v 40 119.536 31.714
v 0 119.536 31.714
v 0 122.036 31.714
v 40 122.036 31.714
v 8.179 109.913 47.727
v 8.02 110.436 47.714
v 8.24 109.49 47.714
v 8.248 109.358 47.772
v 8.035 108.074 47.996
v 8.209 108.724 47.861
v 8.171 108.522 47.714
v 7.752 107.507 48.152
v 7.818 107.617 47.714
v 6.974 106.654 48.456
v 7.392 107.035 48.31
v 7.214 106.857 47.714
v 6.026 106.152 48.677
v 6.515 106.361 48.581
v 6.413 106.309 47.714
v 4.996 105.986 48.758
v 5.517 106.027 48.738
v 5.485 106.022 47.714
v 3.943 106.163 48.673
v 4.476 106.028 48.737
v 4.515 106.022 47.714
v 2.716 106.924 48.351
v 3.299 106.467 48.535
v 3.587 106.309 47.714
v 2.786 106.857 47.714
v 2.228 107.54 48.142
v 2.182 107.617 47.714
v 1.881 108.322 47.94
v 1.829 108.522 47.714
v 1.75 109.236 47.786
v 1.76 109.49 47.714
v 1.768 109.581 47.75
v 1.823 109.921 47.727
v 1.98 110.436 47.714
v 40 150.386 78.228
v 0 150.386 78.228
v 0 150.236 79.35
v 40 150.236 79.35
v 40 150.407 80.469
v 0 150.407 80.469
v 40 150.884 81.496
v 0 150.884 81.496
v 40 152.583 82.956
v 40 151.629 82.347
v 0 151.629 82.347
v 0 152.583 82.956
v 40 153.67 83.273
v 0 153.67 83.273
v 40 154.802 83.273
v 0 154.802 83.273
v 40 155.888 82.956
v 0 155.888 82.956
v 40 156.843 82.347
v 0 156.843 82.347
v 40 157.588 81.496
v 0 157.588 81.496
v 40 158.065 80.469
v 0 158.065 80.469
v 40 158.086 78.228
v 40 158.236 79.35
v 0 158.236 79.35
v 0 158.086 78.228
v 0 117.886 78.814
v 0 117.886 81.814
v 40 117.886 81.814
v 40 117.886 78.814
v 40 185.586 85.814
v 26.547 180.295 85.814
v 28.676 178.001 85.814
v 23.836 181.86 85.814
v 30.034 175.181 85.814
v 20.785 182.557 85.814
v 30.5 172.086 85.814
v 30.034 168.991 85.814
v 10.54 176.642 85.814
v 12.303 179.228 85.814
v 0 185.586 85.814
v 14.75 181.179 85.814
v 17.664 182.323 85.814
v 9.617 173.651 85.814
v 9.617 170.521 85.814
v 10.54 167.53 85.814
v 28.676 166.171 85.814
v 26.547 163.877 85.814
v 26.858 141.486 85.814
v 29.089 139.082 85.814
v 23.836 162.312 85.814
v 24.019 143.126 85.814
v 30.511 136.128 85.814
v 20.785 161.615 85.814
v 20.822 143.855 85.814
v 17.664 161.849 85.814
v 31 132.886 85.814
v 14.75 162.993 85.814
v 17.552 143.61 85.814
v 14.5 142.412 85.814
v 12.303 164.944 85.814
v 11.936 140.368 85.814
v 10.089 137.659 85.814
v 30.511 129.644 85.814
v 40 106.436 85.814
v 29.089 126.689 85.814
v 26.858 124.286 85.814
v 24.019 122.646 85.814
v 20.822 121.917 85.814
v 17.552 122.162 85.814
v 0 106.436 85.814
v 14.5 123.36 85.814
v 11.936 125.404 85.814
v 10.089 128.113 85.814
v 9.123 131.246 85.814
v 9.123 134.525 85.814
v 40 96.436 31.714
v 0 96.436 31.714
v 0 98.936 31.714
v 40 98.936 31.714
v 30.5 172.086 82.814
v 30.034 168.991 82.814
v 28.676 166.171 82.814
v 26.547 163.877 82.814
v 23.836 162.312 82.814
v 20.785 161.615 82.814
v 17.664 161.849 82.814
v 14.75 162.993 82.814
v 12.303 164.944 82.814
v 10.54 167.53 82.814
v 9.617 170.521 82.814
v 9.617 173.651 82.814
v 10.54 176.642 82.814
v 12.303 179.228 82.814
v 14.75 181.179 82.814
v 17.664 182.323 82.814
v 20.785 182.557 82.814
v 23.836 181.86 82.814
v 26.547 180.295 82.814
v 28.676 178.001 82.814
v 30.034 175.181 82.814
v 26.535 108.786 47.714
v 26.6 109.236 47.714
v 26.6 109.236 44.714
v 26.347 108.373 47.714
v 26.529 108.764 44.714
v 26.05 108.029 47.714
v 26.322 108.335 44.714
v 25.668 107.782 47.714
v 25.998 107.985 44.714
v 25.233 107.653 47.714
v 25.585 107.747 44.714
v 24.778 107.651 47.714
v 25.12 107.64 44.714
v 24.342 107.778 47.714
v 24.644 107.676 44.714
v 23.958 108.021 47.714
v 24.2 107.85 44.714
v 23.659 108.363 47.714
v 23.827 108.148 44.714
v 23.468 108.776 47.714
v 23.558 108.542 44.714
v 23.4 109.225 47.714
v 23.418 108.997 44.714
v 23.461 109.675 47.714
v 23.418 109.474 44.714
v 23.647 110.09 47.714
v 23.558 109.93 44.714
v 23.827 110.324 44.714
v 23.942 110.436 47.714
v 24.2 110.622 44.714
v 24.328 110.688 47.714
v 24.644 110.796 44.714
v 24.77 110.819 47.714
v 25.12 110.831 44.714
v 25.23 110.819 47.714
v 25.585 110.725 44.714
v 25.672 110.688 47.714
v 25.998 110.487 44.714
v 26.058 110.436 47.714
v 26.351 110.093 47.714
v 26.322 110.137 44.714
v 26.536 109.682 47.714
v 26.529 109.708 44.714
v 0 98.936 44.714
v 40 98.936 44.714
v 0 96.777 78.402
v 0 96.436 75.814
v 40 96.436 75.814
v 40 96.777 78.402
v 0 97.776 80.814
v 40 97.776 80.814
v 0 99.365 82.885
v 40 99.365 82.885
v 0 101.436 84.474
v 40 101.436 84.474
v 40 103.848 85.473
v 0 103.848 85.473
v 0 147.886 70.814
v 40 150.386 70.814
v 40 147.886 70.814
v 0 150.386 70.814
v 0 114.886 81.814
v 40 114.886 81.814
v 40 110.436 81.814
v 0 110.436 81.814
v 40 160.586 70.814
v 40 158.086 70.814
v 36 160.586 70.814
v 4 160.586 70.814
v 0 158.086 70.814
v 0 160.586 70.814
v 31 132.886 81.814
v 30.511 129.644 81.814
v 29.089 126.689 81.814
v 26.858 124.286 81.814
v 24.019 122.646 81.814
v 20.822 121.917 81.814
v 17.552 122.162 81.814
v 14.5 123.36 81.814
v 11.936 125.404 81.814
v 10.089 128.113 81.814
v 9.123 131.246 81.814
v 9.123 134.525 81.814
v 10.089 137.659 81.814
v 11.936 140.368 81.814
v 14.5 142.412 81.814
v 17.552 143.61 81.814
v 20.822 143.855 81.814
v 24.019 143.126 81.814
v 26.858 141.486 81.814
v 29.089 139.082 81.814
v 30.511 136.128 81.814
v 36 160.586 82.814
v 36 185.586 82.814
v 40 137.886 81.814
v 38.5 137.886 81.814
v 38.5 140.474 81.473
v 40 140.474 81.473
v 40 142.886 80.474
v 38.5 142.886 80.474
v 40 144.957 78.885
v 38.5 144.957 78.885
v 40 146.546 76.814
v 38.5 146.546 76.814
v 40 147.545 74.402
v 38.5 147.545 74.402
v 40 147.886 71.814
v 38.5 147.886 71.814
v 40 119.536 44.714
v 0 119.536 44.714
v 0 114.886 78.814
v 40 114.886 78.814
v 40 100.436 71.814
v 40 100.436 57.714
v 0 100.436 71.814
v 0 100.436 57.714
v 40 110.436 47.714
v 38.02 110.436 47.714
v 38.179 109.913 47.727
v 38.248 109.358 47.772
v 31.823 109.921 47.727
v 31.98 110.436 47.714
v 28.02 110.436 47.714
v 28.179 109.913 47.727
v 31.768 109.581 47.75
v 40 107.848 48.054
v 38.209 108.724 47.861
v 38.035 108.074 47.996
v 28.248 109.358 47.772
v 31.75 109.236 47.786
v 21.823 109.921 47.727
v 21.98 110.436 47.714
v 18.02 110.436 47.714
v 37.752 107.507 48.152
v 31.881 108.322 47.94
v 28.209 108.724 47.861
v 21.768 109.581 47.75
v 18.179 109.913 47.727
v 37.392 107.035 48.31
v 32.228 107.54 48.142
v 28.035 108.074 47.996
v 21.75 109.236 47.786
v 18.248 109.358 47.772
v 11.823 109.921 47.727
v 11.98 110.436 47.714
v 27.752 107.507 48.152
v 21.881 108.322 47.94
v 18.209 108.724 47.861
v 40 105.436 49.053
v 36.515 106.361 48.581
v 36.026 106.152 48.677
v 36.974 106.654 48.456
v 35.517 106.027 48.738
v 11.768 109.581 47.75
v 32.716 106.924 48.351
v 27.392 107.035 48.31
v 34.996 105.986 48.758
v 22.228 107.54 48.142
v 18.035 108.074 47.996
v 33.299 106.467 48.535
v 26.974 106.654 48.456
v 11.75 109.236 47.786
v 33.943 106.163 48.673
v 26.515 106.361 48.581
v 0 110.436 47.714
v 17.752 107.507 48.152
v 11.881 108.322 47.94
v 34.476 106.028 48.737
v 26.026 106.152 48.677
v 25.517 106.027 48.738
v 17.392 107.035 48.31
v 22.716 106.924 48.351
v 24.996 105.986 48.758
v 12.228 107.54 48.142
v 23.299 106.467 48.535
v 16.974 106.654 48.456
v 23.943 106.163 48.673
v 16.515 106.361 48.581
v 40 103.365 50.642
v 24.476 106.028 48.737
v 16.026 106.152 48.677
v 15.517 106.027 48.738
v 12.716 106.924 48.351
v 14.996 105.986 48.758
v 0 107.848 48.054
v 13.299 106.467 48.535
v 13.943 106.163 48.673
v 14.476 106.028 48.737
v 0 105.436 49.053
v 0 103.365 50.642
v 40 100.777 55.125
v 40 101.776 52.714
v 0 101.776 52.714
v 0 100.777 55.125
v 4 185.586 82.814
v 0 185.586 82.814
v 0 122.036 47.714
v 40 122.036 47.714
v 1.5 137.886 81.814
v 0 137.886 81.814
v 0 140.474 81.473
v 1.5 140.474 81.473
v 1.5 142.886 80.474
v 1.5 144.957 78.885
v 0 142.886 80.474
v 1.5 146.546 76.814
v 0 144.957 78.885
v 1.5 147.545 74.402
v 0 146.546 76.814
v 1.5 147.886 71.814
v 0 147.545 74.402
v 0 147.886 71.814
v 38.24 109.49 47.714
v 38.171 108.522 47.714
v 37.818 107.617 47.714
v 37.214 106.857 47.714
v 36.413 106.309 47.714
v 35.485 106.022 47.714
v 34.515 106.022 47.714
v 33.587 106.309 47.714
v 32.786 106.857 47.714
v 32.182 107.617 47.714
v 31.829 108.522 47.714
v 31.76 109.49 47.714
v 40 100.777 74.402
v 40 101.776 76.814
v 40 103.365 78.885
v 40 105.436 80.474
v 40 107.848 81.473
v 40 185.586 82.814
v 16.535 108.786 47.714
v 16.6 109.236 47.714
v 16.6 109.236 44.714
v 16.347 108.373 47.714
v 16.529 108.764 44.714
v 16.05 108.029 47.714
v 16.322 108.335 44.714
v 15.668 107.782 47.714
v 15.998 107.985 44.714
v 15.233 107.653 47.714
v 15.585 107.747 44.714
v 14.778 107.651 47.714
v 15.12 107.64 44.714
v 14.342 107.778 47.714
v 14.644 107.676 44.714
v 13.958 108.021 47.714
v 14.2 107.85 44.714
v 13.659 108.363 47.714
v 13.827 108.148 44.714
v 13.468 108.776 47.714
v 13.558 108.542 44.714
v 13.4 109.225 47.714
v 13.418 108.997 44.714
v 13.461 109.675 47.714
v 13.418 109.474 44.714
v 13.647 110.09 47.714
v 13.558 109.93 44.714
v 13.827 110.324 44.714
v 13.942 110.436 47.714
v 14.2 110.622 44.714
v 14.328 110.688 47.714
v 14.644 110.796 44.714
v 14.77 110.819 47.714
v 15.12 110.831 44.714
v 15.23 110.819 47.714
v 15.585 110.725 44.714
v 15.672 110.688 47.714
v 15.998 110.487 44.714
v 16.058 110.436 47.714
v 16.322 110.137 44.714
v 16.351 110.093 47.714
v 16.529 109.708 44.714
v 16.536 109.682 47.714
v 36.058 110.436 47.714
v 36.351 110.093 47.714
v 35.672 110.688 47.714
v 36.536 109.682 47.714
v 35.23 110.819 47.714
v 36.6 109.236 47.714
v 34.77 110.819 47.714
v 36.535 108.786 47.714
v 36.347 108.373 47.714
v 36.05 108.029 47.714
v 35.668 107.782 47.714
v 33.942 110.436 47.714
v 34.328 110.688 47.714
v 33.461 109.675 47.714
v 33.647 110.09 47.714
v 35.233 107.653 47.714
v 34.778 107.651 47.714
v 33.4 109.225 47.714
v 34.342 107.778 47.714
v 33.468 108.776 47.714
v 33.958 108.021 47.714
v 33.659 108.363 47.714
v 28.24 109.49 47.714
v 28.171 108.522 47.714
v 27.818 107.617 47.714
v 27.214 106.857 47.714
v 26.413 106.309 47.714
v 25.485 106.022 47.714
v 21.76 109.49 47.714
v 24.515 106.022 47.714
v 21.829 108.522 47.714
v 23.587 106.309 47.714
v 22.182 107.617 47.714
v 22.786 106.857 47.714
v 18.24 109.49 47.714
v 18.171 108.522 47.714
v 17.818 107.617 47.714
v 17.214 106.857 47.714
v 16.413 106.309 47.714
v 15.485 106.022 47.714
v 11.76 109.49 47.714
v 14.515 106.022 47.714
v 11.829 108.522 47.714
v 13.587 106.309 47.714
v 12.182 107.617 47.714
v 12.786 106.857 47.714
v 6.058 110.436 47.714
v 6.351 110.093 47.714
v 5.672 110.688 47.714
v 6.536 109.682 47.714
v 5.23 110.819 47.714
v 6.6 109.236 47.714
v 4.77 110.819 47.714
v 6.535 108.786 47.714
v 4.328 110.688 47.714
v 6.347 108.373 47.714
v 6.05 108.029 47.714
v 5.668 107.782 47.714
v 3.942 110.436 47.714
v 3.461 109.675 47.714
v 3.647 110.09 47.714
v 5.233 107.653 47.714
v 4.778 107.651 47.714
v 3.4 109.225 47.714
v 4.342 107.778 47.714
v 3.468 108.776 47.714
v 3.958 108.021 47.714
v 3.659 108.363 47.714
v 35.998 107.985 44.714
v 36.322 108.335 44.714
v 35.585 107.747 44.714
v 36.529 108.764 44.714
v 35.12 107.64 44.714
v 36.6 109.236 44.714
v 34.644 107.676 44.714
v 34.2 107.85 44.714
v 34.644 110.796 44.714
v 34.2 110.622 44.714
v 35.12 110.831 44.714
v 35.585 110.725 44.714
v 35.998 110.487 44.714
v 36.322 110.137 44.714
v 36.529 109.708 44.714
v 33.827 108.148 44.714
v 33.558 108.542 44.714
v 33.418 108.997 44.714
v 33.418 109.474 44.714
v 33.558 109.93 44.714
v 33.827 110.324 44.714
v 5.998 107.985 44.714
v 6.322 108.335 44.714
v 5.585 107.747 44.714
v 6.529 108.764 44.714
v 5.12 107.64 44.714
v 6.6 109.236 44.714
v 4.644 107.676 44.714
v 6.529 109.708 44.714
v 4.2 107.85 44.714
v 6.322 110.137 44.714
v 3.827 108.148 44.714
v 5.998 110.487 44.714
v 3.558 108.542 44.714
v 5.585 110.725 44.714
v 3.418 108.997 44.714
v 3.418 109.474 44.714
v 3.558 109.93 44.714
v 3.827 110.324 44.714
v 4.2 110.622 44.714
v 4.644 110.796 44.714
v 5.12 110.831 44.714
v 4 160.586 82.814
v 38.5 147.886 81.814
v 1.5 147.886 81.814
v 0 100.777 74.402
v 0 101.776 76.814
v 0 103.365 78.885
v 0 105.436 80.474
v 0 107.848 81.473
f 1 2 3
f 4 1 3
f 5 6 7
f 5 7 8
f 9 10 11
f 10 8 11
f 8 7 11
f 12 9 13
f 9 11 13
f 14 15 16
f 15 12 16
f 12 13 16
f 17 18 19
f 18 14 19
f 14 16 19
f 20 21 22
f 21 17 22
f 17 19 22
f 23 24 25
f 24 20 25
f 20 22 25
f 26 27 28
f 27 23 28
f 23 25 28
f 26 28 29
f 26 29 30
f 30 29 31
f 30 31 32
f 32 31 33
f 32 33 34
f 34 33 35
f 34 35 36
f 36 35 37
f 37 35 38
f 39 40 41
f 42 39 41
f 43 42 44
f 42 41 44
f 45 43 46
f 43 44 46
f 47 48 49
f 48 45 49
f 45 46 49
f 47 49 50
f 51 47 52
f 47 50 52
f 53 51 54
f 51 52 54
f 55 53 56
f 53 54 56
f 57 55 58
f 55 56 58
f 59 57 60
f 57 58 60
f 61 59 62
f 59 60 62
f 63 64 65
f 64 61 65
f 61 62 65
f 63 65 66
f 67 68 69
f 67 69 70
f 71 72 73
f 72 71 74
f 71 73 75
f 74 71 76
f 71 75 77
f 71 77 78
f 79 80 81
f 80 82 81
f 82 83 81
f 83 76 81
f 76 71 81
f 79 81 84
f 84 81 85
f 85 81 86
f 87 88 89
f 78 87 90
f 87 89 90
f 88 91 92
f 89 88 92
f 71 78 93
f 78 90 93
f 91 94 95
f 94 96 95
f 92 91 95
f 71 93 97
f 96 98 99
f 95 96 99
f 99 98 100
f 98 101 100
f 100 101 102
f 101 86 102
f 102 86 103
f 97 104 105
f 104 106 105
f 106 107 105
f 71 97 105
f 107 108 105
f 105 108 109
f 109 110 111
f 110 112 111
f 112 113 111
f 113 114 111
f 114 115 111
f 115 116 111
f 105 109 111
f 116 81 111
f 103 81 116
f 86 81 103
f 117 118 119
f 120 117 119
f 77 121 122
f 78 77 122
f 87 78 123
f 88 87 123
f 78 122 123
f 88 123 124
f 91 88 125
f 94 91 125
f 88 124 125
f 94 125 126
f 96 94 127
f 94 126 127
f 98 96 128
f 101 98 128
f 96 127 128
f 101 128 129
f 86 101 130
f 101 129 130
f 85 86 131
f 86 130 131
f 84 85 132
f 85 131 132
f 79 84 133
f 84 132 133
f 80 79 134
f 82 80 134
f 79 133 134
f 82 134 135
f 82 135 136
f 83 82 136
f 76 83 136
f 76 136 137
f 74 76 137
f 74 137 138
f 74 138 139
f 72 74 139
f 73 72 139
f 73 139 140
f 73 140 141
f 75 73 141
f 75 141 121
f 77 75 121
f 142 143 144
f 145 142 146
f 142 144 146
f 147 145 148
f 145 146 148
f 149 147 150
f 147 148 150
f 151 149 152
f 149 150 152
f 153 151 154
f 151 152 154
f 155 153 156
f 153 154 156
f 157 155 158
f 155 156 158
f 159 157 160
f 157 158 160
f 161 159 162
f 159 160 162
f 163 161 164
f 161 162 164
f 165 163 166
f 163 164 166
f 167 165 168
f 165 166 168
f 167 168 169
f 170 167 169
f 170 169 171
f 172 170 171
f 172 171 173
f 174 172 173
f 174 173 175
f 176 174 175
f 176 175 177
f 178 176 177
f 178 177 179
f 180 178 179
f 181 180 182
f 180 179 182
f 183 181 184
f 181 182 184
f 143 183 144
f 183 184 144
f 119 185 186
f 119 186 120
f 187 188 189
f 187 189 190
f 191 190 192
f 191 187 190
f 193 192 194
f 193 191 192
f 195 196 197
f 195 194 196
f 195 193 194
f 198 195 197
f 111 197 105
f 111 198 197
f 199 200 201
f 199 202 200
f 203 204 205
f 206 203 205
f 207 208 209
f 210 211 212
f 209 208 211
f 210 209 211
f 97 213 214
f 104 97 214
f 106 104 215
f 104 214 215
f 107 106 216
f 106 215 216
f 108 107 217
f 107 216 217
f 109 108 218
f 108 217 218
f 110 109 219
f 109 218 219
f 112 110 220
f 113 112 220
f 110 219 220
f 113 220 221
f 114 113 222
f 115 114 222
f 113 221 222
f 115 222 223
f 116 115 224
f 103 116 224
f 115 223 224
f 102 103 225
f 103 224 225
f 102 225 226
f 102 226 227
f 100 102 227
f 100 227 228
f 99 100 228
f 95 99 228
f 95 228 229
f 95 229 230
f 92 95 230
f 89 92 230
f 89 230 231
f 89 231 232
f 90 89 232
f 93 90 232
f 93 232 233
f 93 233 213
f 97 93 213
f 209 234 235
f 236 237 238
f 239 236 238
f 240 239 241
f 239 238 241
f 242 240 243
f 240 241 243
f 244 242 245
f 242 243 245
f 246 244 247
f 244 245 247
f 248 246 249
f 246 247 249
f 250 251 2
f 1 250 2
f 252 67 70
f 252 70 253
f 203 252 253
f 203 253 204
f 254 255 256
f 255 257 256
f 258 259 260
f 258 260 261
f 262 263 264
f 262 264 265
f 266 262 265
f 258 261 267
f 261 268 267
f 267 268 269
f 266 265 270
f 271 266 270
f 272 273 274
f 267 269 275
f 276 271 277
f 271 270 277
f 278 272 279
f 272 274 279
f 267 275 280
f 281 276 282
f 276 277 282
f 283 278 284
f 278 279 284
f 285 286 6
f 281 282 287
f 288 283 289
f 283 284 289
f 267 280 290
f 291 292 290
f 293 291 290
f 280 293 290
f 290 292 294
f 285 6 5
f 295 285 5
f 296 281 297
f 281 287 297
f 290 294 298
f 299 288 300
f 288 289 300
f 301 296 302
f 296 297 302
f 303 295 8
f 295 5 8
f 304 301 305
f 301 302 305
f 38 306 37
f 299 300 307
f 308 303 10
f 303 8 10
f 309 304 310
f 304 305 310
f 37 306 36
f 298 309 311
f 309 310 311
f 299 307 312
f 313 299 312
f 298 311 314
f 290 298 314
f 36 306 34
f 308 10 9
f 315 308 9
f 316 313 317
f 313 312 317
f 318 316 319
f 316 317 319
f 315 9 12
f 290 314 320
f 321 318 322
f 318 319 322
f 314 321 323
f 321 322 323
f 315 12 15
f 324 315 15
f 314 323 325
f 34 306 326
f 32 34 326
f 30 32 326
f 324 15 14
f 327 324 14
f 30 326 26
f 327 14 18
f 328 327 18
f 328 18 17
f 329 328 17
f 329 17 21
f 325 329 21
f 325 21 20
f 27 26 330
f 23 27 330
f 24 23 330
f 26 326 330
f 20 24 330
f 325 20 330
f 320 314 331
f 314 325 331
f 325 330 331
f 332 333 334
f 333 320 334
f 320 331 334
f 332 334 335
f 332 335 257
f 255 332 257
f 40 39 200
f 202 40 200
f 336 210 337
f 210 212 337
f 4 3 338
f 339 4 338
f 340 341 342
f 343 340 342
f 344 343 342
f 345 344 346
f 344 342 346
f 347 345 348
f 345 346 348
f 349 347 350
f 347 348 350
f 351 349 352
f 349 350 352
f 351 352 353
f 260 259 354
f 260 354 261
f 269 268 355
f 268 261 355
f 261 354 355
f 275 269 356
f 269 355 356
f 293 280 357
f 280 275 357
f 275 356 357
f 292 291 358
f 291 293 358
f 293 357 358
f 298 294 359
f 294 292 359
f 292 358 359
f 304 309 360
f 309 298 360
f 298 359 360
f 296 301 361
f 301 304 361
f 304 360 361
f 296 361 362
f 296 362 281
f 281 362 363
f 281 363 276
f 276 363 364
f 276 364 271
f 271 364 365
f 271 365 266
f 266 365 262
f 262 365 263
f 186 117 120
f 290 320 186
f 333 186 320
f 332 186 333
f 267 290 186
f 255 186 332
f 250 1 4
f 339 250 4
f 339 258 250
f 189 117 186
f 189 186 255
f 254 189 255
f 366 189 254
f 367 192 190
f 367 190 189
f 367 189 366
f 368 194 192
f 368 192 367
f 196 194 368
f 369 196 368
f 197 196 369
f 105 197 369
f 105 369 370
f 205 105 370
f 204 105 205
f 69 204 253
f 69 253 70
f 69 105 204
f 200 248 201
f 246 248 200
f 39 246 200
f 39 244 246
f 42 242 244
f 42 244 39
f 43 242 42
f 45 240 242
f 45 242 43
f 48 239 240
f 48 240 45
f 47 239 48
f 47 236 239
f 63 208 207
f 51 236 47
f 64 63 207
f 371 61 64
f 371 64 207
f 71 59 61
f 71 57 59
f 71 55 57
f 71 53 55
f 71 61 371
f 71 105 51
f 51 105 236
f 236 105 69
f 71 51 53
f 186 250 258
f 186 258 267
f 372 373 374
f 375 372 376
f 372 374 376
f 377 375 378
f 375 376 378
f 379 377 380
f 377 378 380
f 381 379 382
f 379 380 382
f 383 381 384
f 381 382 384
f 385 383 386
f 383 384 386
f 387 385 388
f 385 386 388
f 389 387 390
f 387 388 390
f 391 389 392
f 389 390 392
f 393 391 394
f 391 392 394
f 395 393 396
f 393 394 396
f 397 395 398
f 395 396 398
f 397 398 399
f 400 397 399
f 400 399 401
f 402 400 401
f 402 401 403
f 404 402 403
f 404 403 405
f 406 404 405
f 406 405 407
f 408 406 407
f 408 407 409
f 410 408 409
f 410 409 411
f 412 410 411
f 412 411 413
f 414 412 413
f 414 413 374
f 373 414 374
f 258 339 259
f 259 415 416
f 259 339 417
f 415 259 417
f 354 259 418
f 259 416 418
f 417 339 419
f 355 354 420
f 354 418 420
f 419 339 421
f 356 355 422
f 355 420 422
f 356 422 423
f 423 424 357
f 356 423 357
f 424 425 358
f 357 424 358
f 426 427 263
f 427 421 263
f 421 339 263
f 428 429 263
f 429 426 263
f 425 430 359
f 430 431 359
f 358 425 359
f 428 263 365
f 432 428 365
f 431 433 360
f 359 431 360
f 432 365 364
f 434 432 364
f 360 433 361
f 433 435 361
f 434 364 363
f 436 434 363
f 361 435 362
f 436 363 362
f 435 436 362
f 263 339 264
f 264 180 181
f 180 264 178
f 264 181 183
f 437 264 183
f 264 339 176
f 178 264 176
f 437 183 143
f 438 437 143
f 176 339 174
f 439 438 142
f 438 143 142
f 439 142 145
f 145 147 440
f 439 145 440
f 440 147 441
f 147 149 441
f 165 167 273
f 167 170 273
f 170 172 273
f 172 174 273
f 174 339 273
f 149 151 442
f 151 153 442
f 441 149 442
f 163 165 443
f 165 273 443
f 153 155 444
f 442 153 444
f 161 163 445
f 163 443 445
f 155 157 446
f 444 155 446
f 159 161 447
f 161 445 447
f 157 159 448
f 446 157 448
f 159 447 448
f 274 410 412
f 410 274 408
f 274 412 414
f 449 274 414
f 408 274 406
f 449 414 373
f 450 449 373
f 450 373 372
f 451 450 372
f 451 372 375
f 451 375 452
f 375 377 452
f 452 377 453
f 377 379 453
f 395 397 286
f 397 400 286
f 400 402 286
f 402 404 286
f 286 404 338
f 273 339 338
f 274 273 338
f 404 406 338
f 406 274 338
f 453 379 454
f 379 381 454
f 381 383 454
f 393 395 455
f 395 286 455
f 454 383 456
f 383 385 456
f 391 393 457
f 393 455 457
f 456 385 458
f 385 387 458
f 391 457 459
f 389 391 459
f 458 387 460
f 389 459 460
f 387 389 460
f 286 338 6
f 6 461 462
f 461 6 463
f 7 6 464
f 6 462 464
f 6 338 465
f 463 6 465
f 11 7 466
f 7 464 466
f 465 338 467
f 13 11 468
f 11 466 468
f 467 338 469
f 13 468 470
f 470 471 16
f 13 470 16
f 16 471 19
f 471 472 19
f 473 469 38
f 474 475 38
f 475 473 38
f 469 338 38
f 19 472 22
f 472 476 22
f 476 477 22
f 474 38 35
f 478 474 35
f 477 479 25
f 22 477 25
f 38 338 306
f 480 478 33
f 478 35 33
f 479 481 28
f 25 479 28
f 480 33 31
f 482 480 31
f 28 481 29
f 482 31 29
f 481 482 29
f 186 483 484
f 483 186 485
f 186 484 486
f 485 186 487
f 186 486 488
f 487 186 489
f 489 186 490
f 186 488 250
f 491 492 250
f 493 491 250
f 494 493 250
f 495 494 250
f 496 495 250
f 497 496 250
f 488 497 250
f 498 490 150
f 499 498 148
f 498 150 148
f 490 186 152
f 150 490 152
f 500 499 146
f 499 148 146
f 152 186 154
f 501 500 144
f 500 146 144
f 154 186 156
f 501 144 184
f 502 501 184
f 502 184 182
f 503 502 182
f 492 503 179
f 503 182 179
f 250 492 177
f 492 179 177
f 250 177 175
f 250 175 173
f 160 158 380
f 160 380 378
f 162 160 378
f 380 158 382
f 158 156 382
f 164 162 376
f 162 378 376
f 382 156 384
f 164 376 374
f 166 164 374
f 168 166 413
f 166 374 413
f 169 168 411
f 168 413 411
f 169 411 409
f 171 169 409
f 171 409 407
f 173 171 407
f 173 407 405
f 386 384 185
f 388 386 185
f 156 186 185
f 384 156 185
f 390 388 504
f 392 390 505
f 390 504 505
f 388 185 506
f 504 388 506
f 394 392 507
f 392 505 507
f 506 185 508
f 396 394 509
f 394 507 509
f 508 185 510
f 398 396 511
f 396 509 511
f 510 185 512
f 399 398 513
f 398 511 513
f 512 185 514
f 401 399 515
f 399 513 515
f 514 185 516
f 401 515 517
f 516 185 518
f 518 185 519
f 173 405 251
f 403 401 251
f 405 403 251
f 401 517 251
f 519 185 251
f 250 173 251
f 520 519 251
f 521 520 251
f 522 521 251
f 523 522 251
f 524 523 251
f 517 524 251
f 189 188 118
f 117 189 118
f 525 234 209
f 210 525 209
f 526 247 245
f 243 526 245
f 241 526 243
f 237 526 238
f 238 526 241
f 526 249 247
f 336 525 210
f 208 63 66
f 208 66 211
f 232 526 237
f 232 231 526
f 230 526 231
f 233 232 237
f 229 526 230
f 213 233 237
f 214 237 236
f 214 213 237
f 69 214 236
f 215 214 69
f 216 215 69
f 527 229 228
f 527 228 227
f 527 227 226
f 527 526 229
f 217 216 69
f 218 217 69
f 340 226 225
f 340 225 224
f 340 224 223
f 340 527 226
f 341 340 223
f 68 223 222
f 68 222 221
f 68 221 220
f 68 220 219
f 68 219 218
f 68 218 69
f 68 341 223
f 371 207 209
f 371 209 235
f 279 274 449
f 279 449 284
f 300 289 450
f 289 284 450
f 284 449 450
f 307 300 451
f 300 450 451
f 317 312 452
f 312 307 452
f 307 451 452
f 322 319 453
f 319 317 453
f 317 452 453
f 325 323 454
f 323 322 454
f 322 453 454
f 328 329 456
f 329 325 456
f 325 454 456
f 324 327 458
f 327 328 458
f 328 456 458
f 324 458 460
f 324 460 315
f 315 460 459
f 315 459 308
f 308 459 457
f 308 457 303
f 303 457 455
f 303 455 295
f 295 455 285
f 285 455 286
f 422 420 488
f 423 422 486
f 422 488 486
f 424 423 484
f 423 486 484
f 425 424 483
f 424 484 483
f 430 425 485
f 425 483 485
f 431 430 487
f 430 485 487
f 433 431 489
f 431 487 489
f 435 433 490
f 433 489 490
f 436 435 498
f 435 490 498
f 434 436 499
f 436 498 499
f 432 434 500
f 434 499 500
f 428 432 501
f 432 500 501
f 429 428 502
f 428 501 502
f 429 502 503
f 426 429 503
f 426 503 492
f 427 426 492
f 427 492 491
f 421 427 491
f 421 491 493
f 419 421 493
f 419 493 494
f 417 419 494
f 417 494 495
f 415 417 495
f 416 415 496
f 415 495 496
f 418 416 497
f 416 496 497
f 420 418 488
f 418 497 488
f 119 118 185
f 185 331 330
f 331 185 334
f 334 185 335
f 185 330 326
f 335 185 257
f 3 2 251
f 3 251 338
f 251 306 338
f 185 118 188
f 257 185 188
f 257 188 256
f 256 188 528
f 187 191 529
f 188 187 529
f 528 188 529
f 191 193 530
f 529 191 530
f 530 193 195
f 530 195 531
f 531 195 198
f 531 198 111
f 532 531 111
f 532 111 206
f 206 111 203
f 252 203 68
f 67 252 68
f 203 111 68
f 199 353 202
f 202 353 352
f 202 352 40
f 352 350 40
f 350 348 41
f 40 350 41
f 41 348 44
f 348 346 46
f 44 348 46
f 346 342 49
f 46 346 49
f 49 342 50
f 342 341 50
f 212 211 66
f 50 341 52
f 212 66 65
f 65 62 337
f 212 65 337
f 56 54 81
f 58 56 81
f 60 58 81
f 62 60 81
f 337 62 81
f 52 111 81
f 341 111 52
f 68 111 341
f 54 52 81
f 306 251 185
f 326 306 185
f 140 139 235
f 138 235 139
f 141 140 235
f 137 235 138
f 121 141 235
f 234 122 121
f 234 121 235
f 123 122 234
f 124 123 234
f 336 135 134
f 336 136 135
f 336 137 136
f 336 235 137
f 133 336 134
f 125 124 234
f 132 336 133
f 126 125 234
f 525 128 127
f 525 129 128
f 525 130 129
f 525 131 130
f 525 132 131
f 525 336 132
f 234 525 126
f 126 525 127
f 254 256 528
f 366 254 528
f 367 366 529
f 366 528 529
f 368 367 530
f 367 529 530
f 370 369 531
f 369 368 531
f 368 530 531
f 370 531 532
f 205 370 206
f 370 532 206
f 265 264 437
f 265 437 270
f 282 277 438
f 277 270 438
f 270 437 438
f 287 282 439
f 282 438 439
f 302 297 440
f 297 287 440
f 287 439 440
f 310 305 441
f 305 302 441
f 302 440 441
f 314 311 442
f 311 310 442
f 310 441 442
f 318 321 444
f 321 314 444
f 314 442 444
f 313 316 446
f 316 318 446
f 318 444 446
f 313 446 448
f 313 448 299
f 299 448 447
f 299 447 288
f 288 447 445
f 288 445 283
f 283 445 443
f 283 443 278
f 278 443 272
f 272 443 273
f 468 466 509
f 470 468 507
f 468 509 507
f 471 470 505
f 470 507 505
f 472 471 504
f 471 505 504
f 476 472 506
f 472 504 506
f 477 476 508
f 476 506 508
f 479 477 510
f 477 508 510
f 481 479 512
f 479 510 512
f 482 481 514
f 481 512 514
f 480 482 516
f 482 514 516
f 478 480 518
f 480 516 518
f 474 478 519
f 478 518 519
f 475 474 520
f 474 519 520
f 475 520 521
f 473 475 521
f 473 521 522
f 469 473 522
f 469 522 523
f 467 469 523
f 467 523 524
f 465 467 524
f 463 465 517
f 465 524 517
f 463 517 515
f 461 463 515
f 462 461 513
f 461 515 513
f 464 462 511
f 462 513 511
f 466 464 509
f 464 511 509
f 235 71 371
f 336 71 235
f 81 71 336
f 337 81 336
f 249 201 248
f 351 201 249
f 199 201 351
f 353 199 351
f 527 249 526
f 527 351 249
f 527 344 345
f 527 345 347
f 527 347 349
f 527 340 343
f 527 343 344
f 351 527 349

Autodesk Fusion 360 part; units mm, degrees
sketch "Sketch2" plane through (0, 0, 0) normal (1, 0, 0) x (0, 1, 0) in component "Support Batt"
  circle A0 centre (154.2359, 79.3135) radius 4
  line L0 (99.2359, 44.7135) -> (119.2359, 44.7135)
  line L1 (119.2359, 31.7135) -> (119.2359, 44.7135)
  line L2 (99.2359, 31.7135) -> (99.2359, 44.7135)
  line L3 (160.5859, 85.8135) -> (106.4359, 85.8135)
  line L4 (50.5431, 31.7135) -> (52.3447, 31.7135)
  line L5 (52.3447, 31.7135) -> (217.041, 31.7135) construction
  line L6 (96.4359, 75.8135) -> (96.4359, 31.7135)
  line L7 (96.4359, 31.7135) -> (98.9359, 31.7135)
  line L8 (98.9359, 44.7135) -> (119.5359, 44.7135)
  line L9 (119.5359, 44.7135) -> (119.5359, 31.7135)
  line L10 (98.9359, 44.7135) -> (98.9359, 31.7135)
  line L11 (119.5359, 31.7135) -> (122.0359, 31.7135)
  line L12 (154.2359, 83.3135) -> (160.5859, 83.3135) construction
  line L13 (160.5859, 85.8135) -> (160.5859, 70.8135)
  line L14 (158.0859, 70.8135) -> (160.5859, 70.8135)
  line L15 (158.0859, 78.2283) -> (158.0859, 70.8135)
  line L16 (150.3859, 78.2283) -> (150.3859, 70.8135)
  line L17 (150.3859, 70.8135) -> (147.8859, 70.8135)
  line L18 (150.3859, 70.8135) -> (158.0859, 70.8135) construction
  line L19 (154.2359, 79.3135) -> (154.2359, 70.8135) construction
  line L20 (147.8859, 70.8135) -> (147.8859, 71.8135)
  line L21 (137.8859, 81.8135) -> (110.4359, 81.8135)
  line L22 (122.0359, 31.7135) -> (122.0359, 47.7135)
  line L23 (122.0359, 47.7135) -> (110.4359, 47.7135)
  line L24 (100.4359, 57.7135) -> (100.4359, 71.8135)
  arc A1 (110.4359, 81.8135) -> (100.4359, 71.8135) centre (110.4359, 71.8135) ccw
  arc A2 (147.8859, 71.8135) -> (137.8859, 81.8135) centre (137.8859, 71.8135) ccw
  arc A3 (100.4359, 57.7135) -> (110.4359, 47.7135) centre (110.4359, 57.7135) ccw
  arc A4 (158.0859, 78.2283) -> (150.3859, 78.2283) centre (154.2359, 79.3135) ccw
  arc A5 (106.4359, 85.8135) -> (96.4359, 75.8135) centre (106.4359, 75.8135) ccw
  line L25 (114.8859, 81.8135) -> (117.8859, 81.8135)
  line L26 (117.8859, 81.8135) -> (117.8859, 78.8135)
  line L27 (117.8859, 78.8135) -> (114.8859, 78.8135)
  line L28 (114.8859, 78.8135) -> (114.8859, 81.8135)
  line L29 (160.5859, 85.8135) -> (185.5859, 85.8135)
  line L30 (185.5859, 85.8135) -> (185.5859, 82.8135)
  line L31 (185.5859, 82.8135) -> (160.5859, 82.8135)
  line L32 (160.5859, 82.8135) -> (160.5859, 85.8135)
  line L33 (160.5859, 70.8135) -> (185.5859, 82.8135)
  point P0 (96.4359, 85.8135)
  point P1 (100.4359, 81.8135)
  dimension "d2" = 0.3
  dimension "d3" = 0.3
  dimension "d4" = 2.5
  dimension "d5" = 2.5
  dimension "d6" = 2.5
  dimension "d7" = 2.5
  dimension "d8" = 8
  dimension "d9" = 15
  dimension "d10" = 7.7
  dimension "d11" = 2.5
  dimension "d12" = 4
  dimension "d13" = 4
  dimension "d14" = 3
  dimension "d15" = 10
  dimension "d68" = 10
  dimension "d69" = 3
  dimension "d70" = 3
  dimension "d71" = 30
  dimension "d80" = 25
  dimension "d81" = 3
extrude "Extrude1" add sketch "Sketch2" along normal blind 40 contours A0 L0 L3 L6 L7 L8 L9 L10 L11 L13 L14 L15 L16 L17 L20 L21 L22 L23 L24 A1 A2 A3 A4 A5 L25 L32 | L13 L29 L30 L31 L32 | L21 L25 L26 L27 L28 in component "Support Batt"
sketch "Sketch3" plane through (0, 0, 44.7135) normal (0, 0, -1) x (1, 0, 0) in component "Support Batt"
  line L0 (0, -98.9359) -> (0, -119.5359)
  line L1 (0, -119.5359) -> (40, -119.5359)
  line L2 (40, -119.5359) -> (40, -98.9359)
  line L3 (40, -98.9359) -> (0, -98.9359)
  line L4 (0, -109.2359) -> (40, -109.2359) construction
  circle A0 centre (25, -109.2359) radius 1.6
  circle A1 centre (15, -109.2359) radius 1.6
  line L5 (15, -109.2359) -> (25, -109.2359)
  line L6 (20, -109.2359) -> (20, -98.9359)
  circle A2 centre (35, -109.2359) radius 1.6
  circle A3 centre (5, -109.2359) radius 1.6
  dimension "d18" = 3.2
  dimension "d19" = 3.2
  dimension "d33" = 3.2
  dimension "d34" = 3.2
  dimension "d35" = 10
  dimension "d36" = 10
  dimension "d72" = 10
extrude "Extrude2" cut sketch "Sketch3" against normal blind 17 contours A0 | A1 | A2 | A3 in component "Support Batt"
sketch "Sketch4" plane through (0, 0, 47.7135) normal (0, 0, 1) x (-1, 0, 0) in component "Support Batt"
  arc A0 (-26.0583, -110.4359) -> (-23.9417, -110.4359) centre (-25, -109.2359) ccw
  line L0 (-26.0583, -110.4359) -> (-33.9417, -110.4359)
  line L1 (-40, -110.4359) -> (-40, -122.0359)
  line L2 (-40, -122.0359) -> (0, -122.0359)
  line L3 (0, -122.0359) -> (0, -110.4359)
  line L4 (0, -110.4359) -> (-3.9417, -110.4359)
  arc A1 (-16.0583, -110.4359) -> (-13.9417, -110.4359) centre (-15, -109.2359) ccw
  line L5 (-16.0583, -110.4359) -> (-23.9417, -110.4359)
  circle A2 centre (-15, -109.2359) radius 3.25
  circle A3 centre (-25, -109.2359) radius 3.25
  arc A4 (-36.0583, -110.4359) -> (-33.9417, -110.4359) centre (-35, -109.2359) ccw
  line L6 (-36.0583, -110.4359) -> (-40, -110.4359)
  arc A5 (-6.0583, -110.4359) -> (-3.9417, -110.4359) centre (-5, -109.2359) ccw
  line L7 (-6.0583, -110.4359) -> (-13.9417, -110.4359)
  circle A6 centre (-5, -109.2359) radius 3.25
  circle A7 centre (-35, -109.2359) radius 3.25
  dimension "d22" = 6.5
  dimension "d23" = 6.5
  dimension "d37" = 6.5
  dimension "d38" = 6.5
extrude "Extrude3" cut sketch "Sketch4" along normal blind 1.0447 contours A0 L0 L5 A3 | L0 A4 L6 A7 | A1 L5 A2 L7 | L4 A5 L7 A6 picked at (-25.046, -108.9536) picked at (-35.046, -108.9536) picked at (-15.046, -108.9536) picked at (-5.046, -108.9536) in component "Support Batt"
extrude "Extrude3'" add sketch "Sketch2" along normal blind 4 contours L13 L31 L33 in component "Support Batt"
sketch "Sketch5" plane through (40, 0, 0) normal (1, 0, 0) x (0, 1, 0) in component "Support Batt"
  line L0 (158.0859, 70.8135) -> (160.5859, 70.8135)
  line L1 (160.5859, 70.8135) -> (160.5859, 82.8135)
  line L2 (160.5859, 82.8135) -> (185.5859, 82.8135)
  line L3 (185.5859, 82.8135) -> (185.5859, 85.8135)
  line L4 (185.5859, 85.8135) -> (106.4359, 85.8135)
  arc A0 (106.4359, 85.8135) -> (96.4359, 75.8135) centre (106.4359, 75.8135) ccw
  line L5 (96.4359, 75.8135) -> (96.4359, 31.7135)
  line L6 (96.4359, 31.7135) -> (98.9359, 31.7135)
  line L7 (98.9359, 31.7135) -> (98.9359, 44.7135)
  line L8 (98.9359, 44.7135) -> (119.5359, 44.7135)
  line L9 (119.5359, 44.7135) -> (119.5359, 31.7135)
  line L10 (119.5359, 31.7135) -> (122.0359, 31.7135)
  line L11 (122.0359, 31.7135) -> (122.0359, 47.7135)
  line L12 (122.0359, 47.7135) -> (110.4359, 47.7135)
  arc A1 (100.4359, 57.7135) -> (110.4359, 47.7135) centre (110.4359, 57.7135) ccw
  line L13 (100.4359, 57.7135) -> (100.4359, 71.8135)
  arc A2 (110.4359, 81.8135) -> (100.4359, 71.8135) centre (110.4359, 71.8135) ccw
  line L14 (110.4359, 81.8135) -> (114.8859, 81.8135)
  line L15 (114.8859, 81.8135) -> (114.8859, 78.8135)
  line L16 (114.8859, 78.8135) -> (117.8859, 78.8135)
  line L17 (117.8859, 78.8135) -> (117.8859, 81.8135)
  line L18 (117.8859, 81.8135) -> (137.8859, 81.8135)
  arc A3 (147.8859, 71.8135) -> (137.8859, 81.8135) centre (137.8859, 71.8135) ccw
  line L19 (147.8859, 71.8135) -> (147.8859, 70.8135)
  line L20 (147.8859, 70.8135) -> (150.3859, 70.8135)
  line L21
  arc A4 (158.0859, 78.2283) -> (150.3859, 78.2283) centre (154.2359, 79.3135) ccw
  line L22 (158.0859, 78.2283) -> (158.0859, 70.8135)
  line L23 (160.5859, 70.8135) -> (185.5859, 82.8135)
extrude "Extrude4" add sketch "Sketch5" against normal blind 4 in component "Support Batt"
sketch "Sketch4 (1)" plane through (0, 0, 81.8135) normal (0, 0, -1) x (1, 0, 0) in component "Support Batt"
  line L0 (0, -117.8859) -> (0, -137.8859)
  line L1 (0, -137.8859) -> (40, -137.8859)
  line L2 (40, -137.8859) -> (40, -117.8859)
  line L3 (40, -117.8859) -> (0, -117.8859)
  line L4 (0, -147.8859) -> (40, -147.8859)
  line L5 (40, -147.8859) -> (0, -117.8859) construction
  line L6 (0, -158.0859) -> (0, -160.5859) construction
  line L7 (0, -160.5859) -> (4, -160.5859) construction
  line L8 (4, -160.5859) -> (36, -160.5859) construction
  line L9 (36, -160.5859) -> (40, -160.5859) construction
  line L10 (40, -160.5859) -> (40, -158.0859) construction
  line L11 (40, -158.0859) -> (0, -158.0859) construction
  line L12 (0, -160.5859) -> (0, -185.5859) construction
  line L13 (0, -185.5859) -> (4, -185.5859) construction
  line L14 (4, -185.5859) -> (4, -160.5859) construction
  line L15 (4, -160.5859) -> (0, -160.5859) construction
  circle A0 centre (20, -172.0859) radius 10.5
  circle A1 centre (20, -132.8859) radius 11
  line L16 (1.5, -147.8859) -> (38.5, -147.8859)
  line L17 (38.5, -147.8859) -> (38.5, -117.8859)
  line L18 (38.5, -117.8859) -> (1.5, -117.8859)
  line L19 (1.5, -117.8859) -> (1.5, -147.8859)
  line L20 (1.5, -147.8859) -> (38.5, -117.8859) construction
  line L21 (38.5, -147.8859) -> (1.5, -117.8859) construction
  line L22 (20, -158.0859) -> (20, -172.0859)
  point P0 (20, -132.8859)
  dimension "d88" = 21
  dimension "d89" = 22
  dimension "d90" = 37
  dimension "d91" = 30
  dimension "d96" = 14
extrude "Extrude5" cut sketch "Sketch4 (1)" against normal blind 11 contours L1 A1 | L1 A1 | A0 in component "Support Batt"
extrude "Extrude6" cut sketch "Sketch4 (1)" along normal blind 17 contours L1 L4 A1 L16 L17 L19 | L1 A1 picked at (22.1414, -140.7456) in component "Support Batt"
component "Support Batt" placed x (1, 0, 0) y (0, 1, 0) z (0, 0, 1) at (0, 0, 0)
